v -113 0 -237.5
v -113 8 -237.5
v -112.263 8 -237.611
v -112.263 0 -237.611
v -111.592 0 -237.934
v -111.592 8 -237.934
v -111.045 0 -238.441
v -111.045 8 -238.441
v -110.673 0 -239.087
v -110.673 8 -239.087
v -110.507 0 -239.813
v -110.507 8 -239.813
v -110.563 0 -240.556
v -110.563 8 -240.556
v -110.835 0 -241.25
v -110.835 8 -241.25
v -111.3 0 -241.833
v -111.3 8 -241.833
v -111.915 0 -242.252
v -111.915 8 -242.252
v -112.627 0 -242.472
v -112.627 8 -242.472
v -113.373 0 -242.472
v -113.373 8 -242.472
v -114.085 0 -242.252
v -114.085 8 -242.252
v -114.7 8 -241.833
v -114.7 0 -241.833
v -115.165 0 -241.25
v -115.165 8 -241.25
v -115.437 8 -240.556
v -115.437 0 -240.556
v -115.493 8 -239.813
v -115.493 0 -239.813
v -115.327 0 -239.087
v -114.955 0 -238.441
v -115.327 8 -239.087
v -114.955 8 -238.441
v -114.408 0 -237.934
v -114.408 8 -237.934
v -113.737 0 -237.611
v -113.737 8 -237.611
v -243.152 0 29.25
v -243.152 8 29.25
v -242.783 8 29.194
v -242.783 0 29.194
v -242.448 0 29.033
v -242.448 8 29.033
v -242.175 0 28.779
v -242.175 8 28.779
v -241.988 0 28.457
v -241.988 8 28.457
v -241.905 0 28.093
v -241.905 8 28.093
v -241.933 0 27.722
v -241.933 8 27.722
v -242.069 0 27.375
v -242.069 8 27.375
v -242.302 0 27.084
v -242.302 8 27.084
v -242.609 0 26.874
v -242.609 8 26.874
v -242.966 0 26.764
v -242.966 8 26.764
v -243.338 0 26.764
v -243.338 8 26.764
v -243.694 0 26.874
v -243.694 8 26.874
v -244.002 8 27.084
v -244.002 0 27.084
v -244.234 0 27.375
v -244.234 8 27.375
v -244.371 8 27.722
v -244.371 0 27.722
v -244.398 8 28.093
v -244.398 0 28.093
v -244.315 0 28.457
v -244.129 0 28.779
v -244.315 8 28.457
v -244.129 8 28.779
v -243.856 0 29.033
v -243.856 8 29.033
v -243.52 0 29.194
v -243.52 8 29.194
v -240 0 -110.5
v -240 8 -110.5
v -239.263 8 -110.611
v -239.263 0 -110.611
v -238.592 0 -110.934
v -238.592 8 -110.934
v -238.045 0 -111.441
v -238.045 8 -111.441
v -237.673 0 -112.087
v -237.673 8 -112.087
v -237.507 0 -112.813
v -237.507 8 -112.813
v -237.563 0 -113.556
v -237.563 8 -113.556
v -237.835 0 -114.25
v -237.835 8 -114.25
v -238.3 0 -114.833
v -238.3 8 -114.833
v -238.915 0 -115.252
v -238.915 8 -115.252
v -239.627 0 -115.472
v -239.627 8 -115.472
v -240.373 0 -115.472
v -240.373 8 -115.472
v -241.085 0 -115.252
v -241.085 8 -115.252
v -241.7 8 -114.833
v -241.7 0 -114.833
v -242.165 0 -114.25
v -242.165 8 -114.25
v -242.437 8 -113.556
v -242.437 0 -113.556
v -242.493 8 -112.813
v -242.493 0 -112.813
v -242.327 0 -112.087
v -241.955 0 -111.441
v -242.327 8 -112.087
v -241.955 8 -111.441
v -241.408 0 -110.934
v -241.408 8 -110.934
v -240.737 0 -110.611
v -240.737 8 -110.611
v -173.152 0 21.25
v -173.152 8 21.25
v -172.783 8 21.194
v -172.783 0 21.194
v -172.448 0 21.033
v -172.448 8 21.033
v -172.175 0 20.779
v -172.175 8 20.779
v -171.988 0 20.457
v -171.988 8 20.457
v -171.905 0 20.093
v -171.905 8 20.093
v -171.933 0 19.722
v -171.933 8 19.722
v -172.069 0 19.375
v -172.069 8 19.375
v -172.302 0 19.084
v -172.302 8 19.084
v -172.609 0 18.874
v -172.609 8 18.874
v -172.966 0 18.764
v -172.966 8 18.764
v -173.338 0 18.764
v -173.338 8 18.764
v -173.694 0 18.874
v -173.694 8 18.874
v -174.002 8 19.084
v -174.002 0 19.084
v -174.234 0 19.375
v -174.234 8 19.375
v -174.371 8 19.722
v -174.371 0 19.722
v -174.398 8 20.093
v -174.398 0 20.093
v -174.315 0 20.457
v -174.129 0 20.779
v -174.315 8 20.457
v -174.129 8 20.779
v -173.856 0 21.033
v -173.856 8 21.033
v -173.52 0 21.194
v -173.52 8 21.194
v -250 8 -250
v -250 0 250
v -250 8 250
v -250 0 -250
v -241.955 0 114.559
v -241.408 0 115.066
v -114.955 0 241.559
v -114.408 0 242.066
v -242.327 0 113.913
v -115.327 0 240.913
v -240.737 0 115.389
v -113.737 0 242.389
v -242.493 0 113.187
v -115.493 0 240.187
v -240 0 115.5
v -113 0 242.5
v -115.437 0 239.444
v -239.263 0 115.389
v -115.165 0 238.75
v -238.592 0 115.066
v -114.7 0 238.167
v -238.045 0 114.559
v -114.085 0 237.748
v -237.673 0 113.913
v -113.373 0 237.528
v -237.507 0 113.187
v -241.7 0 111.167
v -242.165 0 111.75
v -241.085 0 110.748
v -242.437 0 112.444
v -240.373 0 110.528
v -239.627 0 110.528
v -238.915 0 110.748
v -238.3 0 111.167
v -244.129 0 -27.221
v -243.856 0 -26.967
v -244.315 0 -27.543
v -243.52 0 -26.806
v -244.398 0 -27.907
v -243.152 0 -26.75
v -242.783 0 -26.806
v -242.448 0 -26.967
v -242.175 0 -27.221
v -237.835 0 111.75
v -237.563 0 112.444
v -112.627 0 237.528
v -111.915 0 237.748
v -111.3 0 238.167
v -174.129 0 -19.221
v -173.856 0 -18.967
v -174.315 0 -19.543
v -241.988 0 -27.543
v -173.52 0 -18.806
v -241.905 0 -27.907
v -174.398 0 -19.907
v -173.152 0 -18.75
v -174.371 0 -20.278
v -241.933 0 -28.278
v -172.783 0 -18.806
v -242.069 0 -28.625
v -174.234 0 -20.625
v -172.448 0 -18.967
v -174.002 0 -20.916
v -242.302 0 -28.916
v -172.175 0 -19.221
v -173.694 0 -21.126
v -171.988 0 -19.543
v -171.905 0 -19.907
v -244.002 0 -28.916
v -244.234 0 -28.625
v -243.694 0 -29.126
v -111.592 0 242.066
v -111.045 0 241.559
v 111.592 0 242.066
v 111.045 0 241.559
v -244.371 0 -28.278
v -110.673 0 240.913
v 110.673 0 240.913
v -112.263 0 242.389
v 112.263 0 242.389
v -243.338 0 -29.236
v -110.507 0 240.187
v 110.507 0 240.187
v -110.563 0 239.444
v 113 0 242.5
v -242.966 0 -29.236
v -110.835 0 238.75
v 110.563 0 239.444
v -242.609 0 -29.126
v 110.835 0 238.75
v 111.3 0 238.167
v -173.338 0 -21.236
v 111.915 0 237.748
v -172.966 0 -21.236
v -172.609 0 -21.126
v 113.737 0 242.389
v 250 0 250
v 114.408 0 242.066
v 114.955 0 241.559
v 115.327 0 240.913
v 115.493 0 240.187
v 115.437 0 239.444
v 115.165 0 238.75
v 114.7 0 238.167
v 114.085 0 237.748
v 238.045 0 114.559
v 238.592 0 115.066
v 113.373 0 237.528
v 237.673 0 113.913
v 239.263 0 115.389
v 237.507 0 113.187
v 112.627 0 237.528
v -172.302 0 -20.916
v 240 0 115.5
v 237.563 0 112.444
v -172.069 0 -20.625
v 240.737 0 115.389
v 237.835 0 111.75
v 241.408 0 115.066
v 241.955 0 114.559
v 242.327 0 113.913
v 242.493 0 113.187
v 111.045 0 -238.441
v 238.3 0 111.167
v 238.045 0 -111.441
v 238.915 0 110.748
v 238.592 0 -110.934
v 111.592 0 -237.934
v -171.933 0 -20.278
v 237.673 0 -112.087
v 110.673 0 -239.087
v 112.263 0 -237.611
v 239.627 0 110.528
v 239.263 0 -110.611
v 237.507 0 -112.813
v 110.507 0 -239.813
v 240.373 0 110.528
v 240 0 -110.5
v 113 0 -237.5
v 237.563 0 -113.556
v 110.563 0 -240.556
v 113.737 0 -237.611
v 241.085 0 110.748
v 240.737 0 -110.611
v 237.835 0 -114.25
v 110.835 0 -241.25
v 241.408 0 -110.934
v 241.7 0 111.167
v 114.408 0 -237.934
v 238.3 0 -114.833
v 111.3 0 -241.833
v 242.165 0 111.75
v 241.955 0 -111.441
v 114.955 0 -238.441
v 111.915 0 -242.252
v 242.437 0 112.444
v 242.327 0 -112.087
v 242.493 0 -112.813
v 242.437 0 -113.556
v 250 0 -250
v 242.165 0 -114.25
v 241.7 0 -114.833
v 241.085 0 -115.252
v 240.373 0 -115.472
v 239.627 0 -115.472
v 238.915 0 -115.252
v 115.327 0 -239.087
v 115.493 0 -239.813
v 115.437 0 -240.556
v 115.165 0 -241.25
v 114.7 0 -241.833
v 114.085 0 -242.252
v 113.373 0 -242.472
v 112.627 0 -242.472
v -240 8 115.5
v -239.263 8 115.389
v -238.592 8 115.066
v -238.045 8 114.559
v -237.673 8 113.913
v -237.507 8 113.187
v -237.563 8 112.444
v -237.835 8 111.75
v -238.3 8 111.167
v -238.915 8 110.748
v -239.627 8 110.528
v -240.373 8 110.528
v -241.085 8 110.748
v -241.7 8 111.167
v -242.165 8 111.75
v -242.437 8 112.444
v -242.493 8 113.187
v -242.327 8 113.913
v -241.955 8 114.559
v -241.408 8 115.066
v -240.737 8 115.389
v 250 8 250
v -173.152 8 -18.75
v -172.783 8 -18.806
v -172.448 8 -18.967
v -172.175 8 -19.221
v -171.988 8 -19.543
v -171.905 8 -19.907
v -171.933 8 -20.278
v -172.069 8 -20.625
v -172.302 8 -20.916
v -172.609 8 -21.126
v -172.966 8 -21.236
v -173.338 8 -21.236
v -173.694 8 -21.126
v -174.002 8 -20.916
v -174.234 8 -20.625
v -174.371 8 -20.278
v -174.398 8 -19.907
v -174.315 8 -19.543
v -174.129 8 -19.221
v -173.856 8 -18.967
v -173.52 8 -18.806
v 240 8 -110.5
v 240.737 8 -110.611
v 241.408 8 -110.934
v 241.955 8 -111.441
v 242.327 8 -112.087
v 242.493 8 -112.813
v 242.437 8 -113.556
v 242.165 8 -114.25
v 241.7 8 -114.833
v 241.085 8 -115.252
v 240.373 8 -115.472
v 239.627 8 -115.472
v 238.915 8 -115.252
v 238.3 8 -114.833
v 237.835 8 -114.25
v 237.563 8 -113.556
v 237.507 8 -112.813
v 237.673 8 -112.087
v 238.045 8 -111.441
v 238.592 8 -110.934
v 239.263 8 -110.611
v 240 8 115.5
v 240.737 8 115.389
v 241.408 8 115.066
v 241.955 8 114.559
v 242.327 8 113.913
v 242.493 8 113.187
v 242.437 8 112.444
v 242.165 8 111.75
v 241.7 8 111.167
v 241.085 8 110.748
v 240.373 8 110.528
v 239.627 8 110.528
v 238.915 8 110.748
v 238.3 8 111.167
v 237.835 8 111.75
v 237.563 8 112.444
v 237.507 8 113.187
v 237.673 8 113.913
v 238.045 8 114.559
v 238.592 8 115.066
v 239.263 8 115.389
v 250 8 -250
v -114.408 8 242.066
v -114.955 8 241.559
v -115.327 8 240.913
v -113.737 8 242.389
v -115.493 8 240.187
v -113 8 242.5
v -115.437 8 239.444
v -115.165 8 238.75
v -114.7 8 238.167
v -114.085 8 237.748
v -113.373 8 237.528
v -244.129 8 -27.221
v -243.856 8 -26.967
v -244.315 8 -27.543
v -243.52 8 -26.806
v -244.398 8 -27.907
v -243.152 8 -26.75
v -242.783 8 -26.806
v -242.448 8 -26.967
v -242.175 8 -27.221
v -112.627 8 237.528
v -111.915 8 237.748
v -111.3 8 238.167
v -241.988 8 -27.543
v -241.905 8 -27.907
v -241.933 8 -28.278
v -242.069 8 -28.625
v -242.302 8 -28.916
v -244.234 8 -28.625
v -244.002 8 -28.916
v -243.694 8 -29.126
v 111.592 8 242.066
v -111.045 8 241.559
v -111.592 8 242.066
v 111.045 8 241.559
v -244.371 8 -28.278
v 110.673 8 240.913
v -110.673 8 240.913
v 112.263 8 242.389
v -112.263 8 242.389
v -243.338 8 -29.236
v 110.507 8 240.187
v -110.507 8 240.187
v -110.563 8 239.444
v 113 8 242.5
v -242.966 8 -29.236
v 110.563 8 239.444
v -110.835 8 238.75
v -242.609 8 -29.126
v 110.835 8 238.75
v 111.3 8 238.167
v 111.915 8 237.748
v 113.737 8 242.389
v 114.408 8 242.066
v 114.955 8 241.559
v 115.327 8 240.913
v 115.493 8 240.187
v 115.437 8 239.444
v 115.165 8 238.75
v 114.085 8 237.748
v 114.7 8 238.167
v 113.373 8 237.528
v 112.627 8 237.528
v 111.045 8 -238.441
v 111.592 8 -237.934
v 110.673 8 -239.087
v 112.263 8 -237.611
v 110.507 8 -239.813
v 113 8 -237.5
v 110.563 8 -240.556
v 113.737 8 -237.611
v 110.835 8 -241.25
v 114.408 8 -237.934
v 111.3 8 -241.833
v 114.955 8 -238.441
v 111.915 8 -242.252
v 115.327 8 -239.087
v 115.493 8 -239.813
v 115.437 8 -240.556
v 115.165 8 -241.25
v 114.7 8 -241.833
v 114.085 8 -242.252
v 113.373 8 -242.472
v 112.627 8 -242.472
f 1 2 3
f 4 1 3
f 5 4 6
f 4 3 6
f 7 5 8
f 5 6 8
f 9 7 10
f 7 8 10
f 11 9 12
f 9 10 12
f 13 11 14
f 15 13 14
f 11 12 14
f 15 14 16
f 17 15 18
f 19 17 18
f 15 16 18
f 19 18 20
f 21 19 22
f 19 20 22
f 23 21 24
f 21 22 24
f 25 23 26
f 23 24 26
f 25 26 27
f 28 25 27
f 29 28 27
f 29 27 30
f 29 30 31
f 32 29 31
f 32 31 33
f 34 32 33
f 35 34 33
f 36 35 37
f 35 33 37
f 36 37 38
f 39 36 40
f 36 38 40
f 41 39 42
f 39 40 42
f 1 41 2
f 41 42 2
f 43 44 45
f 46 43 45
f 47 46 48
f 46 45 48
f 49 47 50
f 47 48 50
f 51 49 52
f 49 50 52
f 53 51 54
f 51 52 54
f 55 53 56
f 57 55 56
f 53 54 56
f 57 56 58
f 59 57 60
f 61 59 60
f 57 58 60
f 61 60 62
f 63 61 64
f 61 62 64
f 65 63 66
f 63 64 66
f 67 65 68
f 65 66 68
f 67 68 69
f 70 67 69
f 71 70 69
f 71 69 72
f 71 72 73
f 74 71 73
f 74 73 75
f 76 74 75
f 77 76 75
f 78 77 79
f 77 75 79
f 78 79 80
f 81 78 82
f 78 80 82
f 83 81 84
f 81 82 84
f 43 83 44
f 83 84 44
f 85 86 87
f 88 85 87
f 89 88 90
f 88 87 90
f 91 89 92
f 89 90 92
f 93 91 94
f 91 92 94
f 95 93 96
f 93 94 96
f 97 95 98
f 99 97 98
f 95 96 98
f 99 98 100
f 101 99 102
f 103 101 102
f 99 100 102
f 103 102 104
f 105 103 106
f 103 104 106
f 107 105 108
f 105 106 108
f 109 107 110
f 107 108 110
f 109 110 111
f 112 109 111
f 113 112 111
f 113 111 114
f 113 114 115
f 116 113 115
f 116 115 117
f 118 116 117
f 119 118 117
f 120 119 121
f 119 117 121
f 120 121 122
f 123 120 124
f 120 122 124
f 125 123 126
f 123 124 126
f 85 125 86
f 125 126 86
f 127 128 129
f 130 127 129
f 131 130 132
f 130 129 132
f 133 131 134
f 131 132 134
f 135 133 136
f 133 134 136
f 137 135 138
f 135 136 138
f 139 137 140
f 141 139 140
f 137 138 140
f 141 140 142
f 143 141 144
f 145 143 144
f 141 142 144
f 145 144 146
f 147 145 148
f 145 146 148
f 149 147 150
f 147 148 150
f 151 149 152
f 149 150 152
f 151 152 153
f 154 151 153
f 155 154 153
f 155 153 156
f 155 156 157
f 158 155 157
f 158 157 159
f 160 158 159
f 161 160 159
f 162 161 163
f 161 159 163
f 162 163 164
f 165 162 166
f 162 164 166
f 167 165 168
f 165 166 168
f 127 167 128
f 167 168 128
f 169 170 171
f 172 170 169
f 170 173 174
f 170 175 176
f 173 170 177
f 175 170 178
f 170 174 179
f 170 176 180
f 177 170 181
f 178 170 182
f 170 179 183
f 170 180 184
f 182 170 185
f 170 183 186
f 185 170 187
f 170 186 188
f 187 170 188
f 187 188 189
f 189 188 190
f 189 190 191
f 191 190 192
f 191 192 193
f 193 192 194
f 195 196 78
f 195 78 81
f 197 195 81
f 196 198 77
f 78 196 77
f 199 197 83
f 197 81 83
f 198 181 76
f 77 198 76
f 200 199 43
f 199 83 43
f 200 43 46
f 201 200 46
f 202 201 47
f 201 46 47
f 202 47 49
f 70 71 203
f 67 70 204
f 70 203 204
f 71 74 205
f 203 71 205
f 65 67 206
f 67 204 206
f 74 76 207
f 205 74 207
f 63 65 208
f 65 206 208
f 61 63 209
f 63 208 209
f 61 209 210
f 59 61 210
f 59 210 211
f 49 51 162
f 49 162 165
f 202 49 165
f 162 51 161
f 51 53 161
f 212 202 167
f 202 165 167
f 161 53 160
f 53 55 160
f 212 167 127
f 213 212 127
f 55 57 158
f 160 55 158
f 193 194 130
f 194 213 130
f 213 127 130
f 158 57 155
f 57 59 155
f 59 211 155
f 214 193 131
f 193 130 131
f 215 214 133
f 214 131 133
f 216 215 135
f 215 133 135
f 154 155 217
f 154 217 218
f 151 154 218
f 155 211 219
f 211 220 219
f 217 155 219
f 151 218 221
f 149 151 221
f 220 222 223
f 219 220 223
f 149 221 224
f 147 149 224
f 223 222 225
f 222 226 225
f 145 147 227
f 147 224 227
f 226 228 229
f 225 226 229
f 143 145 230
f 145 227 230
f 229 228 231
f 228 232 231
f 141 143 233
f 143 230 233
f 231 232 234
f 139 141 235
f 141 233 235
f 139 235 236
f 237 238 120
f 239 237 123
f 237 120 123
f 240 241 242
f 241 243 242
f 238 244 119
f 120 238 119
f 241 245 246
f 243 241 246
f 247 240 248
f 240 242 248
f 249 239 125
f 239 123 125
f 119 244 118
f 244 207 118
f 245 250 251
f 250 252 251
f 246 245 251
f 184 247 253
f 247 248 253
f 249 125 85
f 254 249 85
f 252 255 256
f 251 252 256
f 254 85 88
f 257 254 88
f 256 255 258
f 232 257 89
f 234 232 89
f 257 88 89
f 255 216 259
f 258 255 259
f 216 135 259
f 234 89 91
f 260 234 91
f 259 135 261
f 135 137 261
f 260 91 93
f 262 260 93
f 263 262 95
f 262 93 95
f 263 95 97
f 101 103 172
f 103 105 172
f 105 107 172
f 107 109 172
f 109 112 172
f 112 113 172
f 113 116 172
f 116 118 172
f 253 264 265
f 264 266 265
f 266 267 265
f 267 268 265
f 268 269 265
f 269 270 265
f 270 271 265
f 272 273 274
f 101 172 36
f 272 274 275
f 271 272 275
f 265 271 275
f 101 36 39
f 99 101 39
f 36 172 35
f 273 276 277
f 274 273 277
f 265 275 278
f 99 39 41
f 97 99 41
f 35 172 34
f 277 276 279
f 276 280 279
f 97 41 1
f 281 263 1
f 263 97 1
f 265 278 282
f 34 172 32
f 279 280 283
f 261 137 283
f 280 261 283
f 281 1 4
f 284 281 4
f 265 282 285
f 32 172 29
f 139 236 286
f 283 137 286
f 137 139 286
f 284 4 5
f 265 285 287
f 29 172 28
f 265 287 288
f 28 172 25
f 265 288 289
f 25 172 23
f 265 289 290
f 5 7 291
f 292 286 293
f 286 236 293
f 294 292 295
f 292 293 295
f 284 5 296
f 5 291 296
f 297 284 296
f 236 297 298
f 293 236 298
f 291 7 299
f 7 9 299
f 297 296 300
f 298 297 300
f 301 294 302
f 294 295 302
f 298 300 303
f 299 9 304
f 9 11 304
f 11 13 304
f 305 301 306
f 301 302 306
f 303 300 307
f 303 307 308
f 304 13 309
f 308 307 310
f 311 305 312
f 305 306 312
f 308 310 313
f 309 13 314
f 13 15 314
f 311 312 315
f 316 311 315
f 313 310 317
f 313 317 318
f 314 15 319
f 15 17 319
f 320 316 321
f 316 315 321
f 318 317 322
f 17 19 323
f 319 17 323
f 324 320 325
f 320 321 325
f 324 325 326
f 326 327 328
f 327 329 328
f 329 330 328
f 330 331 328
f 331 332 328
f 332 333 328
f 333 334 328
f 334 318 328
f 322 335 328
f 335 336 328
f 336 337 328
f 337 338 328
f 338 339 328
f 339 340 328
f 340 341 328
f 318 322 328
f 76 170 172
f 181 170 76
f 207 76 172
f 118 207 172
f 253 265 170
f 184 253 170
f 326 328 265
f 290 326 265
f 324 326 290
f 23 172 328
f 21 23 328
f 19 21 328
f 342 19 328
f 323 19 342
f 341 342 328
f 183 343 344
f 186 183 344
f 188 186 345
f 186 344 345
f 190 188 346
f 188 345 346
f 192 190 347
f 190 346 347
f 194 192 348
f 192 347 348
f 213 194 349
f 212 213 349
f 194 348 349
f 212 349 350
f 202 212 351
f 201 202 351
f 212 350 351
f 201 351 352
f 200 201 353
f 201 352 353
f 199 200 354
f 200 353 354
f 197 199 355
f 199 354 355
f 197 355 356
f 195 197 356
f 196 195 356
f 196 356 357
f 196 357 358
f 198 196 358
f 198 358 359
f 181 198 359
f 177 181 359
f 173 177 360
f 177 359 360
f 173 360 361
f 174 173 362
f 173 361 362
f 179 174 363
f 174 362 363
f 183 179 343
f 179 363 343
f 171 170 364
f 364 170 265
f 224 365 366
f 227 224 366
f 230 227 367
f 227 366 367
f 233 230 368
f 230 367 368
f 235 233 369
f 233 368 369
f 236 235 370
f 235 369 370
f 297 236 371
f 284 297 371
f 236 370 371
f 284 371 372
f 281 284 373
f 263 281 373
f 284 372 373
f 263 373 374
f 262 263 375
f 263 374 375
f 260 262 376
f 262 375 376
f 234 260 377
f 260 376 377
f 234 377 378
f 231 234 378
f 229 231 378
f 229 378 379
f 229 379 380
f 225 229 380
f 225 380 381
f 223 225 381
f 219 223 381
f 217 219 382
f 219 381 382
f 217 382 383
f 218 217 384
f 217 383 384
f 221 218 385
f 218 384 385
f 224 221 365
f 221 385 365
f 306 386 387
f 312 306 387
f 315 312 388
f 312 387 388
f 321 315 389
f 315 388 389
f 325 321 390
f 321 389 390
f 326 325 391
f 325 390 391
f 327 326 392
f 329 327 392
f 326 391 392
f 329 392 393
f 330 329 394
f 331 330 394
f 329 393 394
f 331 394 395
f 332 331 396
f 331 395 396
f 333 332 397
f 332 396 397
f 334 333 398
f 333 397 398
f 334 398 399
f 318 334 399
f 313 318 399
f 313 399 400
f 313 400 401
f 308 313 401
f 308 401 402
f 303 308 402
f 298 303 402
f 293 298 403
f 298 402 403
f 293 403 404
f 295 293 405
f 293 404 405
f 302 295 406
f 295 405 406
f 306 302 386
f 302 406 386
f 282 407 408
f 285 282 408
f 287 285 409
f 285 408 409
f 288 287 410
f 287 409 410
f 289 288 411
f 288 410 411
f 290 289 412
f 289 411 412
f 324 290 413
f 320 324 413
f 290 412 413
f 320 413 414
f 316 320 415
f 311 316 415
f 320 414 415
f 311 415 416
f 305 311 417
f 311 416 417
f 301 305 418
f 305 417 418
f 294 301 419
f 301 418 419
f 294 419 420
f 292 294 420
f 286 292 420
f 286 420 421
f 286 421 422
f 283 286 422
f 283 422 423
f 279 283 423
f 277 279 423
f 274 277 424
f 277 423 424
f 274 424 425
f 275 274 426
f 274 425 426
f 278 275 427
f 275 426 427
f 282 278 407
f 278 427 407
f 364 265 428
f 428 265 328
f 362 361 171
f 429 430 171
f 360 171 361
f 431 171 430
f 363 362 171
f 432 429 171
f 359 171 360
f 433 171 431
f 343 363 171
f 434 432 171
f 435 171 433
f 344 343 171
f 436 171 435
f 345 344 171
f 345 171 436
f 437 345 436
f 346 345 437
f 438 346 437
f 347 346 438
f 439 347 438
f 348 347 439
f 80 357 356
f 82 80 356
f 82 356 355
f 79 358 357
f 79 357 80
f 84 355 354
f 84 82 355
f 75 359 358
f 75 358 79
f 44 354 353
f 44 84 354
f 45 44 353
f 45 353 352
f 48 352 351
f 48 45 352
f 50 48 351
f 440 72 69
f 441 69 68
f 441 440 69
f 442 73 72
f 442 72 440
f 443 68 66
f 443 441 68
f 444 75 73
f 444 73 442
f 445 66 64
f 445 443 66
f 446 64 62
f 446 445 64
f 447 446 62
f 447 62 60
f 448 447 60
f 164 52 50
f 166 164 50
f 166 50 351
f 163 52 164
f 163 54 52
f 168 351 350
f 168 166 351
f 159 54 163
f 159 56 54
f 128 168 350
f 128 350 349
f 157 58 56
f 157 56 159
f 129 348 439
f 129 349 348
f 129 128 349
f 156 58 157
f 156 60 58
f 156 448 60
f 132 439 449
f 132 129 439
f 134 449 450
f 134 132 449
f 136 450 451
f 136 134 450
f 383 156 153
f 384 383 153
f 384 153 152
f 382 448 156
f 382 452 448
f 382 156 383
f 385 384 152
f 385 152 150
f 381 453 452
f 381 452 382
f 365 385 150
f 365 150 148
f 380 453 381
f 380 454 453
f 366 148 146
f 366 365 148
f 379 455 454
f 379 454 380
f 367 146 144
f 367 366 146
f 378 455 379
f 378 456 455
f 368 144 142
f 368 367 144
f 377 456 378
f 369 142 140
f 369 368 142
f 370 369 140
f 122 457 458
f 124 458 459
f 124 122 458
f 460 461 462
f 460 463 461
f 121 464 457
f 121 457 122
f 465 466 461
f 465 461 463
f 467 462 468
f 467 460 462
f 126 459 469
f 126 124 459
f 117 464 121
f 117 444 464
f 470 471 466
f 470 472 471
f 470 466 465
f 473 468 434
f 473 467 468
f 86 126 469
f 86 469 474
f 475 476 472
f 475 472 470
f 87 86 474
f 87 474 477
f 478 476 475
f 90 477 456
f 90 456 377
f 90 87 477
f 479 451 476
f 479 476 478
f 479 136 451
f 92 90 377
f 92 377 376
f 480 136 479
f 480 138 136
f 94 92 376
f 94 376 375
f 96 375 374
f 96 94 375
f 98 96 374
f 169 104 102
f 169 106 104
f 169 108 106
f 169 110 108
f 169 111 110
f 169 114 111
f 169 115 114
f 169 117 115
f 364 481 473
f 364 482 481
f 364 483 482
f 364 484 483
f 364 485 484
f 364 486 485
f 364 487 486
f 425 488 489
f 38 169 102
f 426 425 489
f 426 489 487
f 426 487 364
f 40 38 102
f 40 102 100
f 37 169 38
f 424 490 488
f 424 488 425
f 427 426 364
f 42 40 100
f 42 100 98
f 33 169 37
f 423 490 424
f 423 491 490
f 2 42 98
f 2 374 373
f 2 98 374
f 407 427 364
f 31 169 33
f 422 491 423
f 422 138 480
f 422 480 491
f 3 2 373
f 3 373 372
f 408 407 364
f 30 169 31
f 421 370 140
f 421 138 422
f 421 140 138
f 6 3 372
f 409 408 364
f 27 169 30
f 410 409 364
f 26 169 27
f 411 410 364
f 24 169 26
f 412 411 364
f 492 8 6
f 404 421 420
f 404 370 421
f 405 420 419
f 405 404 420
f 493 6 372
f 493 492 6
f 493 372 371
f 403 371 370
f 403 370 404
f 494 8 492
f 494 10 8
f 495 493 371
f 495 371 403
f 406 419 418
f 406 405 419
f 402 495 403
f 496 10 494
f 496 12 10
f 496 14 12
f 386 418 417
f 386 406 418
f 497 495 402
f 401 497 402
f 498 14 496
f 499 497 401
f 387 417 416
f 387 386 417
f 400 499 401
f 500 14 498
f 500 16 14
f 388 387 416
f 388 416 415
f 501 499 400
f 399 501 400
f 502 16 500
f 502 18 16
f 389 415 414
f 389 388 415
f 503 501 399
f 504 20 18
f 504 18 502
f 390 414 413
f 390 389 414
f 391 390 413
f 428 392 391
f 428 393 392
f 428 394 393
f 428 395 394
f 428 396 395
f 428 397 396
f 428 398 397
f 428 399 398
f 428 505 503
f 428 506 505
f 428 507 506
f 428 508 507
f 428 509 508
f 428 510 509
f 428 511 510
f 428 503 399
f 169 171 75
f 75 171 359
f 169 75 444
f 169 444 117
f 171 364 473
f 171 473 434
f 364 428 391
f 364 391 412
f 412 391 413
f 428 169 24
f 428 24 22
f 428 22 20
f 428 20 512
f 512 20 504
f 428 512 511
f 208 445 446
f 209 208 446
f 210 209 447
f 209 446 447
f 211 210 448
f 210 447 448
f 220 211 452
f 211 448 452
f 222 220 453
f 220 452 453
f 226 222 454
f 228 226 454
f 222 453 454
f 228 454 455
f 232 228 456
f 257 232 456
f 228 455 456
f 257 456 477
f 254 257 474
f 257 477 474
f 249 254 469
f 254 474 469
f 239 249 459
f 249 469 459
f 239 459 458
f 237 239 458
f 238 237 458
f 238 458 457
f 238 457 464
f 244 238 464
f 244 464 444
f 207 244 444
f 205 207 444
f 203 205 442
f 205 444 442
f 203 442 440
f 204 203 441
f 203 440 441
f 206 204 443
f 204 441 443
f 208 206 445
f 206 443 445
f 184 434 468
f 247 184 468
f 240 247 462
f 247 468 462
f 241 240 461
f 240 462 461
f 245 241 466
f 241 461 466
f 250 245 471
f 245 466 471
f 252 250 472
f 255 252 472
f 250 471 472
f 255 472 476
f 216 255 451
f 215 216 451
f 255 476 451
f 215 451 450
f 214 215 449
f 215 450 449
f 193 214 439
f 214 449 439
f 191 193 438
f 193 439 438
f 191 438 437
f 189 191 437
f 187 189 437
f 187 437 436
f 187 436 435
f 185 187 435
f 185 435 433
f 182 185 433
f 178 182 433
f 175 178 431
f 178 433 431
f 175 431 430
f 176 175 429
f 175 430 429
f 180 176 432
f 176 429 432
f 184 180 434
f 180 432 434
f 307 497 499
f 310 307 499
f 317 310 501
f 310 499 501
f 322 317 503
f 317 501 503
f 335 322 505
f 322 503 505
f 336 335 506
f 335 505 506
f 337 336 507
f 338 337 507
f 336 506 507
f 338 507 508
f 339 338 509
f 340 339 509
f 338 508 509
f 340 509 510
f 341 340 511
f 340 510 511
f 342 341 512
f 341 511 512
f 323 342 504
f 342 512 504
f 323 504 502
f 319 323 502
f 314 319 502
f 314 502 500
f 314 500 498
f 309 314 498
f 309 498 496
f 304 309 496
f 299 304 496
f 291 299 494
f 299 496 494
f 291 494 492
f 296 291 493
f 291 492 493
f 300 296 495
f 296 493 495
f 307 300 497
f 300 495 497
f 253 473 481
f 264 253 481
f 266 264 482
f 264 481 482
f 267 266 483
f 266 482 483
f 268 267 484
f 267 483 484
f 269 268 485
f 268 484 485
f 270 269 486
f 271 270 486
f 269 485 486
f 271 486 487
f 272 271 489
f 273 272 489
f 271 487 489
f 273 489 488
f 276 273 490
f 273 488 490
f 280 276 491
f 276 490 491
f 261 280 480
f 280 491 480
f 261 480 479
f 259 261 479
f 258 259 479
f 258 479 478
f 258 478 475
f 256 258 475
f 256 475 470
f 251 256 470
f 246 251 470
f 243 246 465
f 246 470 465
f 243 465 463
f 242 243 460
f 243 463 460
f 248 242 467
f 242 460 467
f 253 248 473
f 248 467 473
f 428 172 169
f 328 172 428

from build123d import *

# Parameters (mm, degrees)
SKETCH1_W           = 500
SKETCH1_H           = 500
BOSS_EXTRUDE1_DEPTH = 8
SKETCH6_R           = 2.5
CUT_EXTRUDE5_DEPTH  = 8
SKETCH5_R           = 1.25
CUT_EXTRUDE4_DEPTH  = 8


with BuildPart() as part:
    # Sketch1 → Boss-Extrude1 (new body)
    with BuildSketch(Plane(origin=(0, 0, 0), x_dir=(1, 0, 0), z_dir=(0, 1, 0))):
        Rectangle(SKETCH1_W, SKETCH1_H)
    extrude(amount=BOSS_EXTRUDE1_DEPTH)

    # Sketch6 → Cut-Extrude5 (cut)
    with BuildSketch(Plane(origin=(0, 8, 0), x_dir=(1, 0, 0), z_dir=(0, 1, 0))):
        with Locations(Location((-240, -113, 0), (0, 0, 270))):
            Circle(SKETCH6_R)
        with Locations(Location((-240, 113, 0), (0, 0, 270))):
            Circle(SKETCH6_R)
        with Locations(Location((-113, 240, 0), (0, 0, 270))):
            Circle(SKETCH6_R)
        with Locations(Location((113, 240, 0), (0, 0, 270))):
            Circle(SKETCH6_R)
        with Locations(Location((240, 113, 0), (0, 0, 270))):
            Circle(SKETCH6_R)
        with Locations(Location((240, -113, 0), (0, 0, 270))):
            Circle(SKETCH6_R)
        with Locations(Location((113, -240, 0), (0, 0, 270))):
            Circle(SKETCH6_R)
        with Locations(Location((-113, -240, 0), (0, 0, 270))):
            Circle(SKETCH6_R)
    extrude(amount=-CUT_EXTRUDE5_DEPTH, mode=Mode.SUBTRACT)

    # Sketch5 → Cut-Extrude4 (cut)
    with BuildSketch(Plane(origin=(0, 8, 0), x_dir=(1, 0, 0), z_dir=(0, 1, 0))):
        with Locations(Location((-243.151847812, 28, 0), (0, 0, 270))):
            Circle(SKETCH5_R)
        with Locations(Location((-173.151847812, 20, 0), (0, 0, 270))):
            Circle(SKETCH5_R)
        with Locations(Location((-173.151847812, -20, 0), (0, 0, 270))):
            Circle(SKETCH5_R)
        with Locations(Location((-243.151847812, -28, 0), (0, 0, 270))):
            Circle(SKETCH5_R)
    extrude(amount=-CUT_EXTRUDE4_DEPTH, mode=Mode.SUBTRACT)


solid = part.part
